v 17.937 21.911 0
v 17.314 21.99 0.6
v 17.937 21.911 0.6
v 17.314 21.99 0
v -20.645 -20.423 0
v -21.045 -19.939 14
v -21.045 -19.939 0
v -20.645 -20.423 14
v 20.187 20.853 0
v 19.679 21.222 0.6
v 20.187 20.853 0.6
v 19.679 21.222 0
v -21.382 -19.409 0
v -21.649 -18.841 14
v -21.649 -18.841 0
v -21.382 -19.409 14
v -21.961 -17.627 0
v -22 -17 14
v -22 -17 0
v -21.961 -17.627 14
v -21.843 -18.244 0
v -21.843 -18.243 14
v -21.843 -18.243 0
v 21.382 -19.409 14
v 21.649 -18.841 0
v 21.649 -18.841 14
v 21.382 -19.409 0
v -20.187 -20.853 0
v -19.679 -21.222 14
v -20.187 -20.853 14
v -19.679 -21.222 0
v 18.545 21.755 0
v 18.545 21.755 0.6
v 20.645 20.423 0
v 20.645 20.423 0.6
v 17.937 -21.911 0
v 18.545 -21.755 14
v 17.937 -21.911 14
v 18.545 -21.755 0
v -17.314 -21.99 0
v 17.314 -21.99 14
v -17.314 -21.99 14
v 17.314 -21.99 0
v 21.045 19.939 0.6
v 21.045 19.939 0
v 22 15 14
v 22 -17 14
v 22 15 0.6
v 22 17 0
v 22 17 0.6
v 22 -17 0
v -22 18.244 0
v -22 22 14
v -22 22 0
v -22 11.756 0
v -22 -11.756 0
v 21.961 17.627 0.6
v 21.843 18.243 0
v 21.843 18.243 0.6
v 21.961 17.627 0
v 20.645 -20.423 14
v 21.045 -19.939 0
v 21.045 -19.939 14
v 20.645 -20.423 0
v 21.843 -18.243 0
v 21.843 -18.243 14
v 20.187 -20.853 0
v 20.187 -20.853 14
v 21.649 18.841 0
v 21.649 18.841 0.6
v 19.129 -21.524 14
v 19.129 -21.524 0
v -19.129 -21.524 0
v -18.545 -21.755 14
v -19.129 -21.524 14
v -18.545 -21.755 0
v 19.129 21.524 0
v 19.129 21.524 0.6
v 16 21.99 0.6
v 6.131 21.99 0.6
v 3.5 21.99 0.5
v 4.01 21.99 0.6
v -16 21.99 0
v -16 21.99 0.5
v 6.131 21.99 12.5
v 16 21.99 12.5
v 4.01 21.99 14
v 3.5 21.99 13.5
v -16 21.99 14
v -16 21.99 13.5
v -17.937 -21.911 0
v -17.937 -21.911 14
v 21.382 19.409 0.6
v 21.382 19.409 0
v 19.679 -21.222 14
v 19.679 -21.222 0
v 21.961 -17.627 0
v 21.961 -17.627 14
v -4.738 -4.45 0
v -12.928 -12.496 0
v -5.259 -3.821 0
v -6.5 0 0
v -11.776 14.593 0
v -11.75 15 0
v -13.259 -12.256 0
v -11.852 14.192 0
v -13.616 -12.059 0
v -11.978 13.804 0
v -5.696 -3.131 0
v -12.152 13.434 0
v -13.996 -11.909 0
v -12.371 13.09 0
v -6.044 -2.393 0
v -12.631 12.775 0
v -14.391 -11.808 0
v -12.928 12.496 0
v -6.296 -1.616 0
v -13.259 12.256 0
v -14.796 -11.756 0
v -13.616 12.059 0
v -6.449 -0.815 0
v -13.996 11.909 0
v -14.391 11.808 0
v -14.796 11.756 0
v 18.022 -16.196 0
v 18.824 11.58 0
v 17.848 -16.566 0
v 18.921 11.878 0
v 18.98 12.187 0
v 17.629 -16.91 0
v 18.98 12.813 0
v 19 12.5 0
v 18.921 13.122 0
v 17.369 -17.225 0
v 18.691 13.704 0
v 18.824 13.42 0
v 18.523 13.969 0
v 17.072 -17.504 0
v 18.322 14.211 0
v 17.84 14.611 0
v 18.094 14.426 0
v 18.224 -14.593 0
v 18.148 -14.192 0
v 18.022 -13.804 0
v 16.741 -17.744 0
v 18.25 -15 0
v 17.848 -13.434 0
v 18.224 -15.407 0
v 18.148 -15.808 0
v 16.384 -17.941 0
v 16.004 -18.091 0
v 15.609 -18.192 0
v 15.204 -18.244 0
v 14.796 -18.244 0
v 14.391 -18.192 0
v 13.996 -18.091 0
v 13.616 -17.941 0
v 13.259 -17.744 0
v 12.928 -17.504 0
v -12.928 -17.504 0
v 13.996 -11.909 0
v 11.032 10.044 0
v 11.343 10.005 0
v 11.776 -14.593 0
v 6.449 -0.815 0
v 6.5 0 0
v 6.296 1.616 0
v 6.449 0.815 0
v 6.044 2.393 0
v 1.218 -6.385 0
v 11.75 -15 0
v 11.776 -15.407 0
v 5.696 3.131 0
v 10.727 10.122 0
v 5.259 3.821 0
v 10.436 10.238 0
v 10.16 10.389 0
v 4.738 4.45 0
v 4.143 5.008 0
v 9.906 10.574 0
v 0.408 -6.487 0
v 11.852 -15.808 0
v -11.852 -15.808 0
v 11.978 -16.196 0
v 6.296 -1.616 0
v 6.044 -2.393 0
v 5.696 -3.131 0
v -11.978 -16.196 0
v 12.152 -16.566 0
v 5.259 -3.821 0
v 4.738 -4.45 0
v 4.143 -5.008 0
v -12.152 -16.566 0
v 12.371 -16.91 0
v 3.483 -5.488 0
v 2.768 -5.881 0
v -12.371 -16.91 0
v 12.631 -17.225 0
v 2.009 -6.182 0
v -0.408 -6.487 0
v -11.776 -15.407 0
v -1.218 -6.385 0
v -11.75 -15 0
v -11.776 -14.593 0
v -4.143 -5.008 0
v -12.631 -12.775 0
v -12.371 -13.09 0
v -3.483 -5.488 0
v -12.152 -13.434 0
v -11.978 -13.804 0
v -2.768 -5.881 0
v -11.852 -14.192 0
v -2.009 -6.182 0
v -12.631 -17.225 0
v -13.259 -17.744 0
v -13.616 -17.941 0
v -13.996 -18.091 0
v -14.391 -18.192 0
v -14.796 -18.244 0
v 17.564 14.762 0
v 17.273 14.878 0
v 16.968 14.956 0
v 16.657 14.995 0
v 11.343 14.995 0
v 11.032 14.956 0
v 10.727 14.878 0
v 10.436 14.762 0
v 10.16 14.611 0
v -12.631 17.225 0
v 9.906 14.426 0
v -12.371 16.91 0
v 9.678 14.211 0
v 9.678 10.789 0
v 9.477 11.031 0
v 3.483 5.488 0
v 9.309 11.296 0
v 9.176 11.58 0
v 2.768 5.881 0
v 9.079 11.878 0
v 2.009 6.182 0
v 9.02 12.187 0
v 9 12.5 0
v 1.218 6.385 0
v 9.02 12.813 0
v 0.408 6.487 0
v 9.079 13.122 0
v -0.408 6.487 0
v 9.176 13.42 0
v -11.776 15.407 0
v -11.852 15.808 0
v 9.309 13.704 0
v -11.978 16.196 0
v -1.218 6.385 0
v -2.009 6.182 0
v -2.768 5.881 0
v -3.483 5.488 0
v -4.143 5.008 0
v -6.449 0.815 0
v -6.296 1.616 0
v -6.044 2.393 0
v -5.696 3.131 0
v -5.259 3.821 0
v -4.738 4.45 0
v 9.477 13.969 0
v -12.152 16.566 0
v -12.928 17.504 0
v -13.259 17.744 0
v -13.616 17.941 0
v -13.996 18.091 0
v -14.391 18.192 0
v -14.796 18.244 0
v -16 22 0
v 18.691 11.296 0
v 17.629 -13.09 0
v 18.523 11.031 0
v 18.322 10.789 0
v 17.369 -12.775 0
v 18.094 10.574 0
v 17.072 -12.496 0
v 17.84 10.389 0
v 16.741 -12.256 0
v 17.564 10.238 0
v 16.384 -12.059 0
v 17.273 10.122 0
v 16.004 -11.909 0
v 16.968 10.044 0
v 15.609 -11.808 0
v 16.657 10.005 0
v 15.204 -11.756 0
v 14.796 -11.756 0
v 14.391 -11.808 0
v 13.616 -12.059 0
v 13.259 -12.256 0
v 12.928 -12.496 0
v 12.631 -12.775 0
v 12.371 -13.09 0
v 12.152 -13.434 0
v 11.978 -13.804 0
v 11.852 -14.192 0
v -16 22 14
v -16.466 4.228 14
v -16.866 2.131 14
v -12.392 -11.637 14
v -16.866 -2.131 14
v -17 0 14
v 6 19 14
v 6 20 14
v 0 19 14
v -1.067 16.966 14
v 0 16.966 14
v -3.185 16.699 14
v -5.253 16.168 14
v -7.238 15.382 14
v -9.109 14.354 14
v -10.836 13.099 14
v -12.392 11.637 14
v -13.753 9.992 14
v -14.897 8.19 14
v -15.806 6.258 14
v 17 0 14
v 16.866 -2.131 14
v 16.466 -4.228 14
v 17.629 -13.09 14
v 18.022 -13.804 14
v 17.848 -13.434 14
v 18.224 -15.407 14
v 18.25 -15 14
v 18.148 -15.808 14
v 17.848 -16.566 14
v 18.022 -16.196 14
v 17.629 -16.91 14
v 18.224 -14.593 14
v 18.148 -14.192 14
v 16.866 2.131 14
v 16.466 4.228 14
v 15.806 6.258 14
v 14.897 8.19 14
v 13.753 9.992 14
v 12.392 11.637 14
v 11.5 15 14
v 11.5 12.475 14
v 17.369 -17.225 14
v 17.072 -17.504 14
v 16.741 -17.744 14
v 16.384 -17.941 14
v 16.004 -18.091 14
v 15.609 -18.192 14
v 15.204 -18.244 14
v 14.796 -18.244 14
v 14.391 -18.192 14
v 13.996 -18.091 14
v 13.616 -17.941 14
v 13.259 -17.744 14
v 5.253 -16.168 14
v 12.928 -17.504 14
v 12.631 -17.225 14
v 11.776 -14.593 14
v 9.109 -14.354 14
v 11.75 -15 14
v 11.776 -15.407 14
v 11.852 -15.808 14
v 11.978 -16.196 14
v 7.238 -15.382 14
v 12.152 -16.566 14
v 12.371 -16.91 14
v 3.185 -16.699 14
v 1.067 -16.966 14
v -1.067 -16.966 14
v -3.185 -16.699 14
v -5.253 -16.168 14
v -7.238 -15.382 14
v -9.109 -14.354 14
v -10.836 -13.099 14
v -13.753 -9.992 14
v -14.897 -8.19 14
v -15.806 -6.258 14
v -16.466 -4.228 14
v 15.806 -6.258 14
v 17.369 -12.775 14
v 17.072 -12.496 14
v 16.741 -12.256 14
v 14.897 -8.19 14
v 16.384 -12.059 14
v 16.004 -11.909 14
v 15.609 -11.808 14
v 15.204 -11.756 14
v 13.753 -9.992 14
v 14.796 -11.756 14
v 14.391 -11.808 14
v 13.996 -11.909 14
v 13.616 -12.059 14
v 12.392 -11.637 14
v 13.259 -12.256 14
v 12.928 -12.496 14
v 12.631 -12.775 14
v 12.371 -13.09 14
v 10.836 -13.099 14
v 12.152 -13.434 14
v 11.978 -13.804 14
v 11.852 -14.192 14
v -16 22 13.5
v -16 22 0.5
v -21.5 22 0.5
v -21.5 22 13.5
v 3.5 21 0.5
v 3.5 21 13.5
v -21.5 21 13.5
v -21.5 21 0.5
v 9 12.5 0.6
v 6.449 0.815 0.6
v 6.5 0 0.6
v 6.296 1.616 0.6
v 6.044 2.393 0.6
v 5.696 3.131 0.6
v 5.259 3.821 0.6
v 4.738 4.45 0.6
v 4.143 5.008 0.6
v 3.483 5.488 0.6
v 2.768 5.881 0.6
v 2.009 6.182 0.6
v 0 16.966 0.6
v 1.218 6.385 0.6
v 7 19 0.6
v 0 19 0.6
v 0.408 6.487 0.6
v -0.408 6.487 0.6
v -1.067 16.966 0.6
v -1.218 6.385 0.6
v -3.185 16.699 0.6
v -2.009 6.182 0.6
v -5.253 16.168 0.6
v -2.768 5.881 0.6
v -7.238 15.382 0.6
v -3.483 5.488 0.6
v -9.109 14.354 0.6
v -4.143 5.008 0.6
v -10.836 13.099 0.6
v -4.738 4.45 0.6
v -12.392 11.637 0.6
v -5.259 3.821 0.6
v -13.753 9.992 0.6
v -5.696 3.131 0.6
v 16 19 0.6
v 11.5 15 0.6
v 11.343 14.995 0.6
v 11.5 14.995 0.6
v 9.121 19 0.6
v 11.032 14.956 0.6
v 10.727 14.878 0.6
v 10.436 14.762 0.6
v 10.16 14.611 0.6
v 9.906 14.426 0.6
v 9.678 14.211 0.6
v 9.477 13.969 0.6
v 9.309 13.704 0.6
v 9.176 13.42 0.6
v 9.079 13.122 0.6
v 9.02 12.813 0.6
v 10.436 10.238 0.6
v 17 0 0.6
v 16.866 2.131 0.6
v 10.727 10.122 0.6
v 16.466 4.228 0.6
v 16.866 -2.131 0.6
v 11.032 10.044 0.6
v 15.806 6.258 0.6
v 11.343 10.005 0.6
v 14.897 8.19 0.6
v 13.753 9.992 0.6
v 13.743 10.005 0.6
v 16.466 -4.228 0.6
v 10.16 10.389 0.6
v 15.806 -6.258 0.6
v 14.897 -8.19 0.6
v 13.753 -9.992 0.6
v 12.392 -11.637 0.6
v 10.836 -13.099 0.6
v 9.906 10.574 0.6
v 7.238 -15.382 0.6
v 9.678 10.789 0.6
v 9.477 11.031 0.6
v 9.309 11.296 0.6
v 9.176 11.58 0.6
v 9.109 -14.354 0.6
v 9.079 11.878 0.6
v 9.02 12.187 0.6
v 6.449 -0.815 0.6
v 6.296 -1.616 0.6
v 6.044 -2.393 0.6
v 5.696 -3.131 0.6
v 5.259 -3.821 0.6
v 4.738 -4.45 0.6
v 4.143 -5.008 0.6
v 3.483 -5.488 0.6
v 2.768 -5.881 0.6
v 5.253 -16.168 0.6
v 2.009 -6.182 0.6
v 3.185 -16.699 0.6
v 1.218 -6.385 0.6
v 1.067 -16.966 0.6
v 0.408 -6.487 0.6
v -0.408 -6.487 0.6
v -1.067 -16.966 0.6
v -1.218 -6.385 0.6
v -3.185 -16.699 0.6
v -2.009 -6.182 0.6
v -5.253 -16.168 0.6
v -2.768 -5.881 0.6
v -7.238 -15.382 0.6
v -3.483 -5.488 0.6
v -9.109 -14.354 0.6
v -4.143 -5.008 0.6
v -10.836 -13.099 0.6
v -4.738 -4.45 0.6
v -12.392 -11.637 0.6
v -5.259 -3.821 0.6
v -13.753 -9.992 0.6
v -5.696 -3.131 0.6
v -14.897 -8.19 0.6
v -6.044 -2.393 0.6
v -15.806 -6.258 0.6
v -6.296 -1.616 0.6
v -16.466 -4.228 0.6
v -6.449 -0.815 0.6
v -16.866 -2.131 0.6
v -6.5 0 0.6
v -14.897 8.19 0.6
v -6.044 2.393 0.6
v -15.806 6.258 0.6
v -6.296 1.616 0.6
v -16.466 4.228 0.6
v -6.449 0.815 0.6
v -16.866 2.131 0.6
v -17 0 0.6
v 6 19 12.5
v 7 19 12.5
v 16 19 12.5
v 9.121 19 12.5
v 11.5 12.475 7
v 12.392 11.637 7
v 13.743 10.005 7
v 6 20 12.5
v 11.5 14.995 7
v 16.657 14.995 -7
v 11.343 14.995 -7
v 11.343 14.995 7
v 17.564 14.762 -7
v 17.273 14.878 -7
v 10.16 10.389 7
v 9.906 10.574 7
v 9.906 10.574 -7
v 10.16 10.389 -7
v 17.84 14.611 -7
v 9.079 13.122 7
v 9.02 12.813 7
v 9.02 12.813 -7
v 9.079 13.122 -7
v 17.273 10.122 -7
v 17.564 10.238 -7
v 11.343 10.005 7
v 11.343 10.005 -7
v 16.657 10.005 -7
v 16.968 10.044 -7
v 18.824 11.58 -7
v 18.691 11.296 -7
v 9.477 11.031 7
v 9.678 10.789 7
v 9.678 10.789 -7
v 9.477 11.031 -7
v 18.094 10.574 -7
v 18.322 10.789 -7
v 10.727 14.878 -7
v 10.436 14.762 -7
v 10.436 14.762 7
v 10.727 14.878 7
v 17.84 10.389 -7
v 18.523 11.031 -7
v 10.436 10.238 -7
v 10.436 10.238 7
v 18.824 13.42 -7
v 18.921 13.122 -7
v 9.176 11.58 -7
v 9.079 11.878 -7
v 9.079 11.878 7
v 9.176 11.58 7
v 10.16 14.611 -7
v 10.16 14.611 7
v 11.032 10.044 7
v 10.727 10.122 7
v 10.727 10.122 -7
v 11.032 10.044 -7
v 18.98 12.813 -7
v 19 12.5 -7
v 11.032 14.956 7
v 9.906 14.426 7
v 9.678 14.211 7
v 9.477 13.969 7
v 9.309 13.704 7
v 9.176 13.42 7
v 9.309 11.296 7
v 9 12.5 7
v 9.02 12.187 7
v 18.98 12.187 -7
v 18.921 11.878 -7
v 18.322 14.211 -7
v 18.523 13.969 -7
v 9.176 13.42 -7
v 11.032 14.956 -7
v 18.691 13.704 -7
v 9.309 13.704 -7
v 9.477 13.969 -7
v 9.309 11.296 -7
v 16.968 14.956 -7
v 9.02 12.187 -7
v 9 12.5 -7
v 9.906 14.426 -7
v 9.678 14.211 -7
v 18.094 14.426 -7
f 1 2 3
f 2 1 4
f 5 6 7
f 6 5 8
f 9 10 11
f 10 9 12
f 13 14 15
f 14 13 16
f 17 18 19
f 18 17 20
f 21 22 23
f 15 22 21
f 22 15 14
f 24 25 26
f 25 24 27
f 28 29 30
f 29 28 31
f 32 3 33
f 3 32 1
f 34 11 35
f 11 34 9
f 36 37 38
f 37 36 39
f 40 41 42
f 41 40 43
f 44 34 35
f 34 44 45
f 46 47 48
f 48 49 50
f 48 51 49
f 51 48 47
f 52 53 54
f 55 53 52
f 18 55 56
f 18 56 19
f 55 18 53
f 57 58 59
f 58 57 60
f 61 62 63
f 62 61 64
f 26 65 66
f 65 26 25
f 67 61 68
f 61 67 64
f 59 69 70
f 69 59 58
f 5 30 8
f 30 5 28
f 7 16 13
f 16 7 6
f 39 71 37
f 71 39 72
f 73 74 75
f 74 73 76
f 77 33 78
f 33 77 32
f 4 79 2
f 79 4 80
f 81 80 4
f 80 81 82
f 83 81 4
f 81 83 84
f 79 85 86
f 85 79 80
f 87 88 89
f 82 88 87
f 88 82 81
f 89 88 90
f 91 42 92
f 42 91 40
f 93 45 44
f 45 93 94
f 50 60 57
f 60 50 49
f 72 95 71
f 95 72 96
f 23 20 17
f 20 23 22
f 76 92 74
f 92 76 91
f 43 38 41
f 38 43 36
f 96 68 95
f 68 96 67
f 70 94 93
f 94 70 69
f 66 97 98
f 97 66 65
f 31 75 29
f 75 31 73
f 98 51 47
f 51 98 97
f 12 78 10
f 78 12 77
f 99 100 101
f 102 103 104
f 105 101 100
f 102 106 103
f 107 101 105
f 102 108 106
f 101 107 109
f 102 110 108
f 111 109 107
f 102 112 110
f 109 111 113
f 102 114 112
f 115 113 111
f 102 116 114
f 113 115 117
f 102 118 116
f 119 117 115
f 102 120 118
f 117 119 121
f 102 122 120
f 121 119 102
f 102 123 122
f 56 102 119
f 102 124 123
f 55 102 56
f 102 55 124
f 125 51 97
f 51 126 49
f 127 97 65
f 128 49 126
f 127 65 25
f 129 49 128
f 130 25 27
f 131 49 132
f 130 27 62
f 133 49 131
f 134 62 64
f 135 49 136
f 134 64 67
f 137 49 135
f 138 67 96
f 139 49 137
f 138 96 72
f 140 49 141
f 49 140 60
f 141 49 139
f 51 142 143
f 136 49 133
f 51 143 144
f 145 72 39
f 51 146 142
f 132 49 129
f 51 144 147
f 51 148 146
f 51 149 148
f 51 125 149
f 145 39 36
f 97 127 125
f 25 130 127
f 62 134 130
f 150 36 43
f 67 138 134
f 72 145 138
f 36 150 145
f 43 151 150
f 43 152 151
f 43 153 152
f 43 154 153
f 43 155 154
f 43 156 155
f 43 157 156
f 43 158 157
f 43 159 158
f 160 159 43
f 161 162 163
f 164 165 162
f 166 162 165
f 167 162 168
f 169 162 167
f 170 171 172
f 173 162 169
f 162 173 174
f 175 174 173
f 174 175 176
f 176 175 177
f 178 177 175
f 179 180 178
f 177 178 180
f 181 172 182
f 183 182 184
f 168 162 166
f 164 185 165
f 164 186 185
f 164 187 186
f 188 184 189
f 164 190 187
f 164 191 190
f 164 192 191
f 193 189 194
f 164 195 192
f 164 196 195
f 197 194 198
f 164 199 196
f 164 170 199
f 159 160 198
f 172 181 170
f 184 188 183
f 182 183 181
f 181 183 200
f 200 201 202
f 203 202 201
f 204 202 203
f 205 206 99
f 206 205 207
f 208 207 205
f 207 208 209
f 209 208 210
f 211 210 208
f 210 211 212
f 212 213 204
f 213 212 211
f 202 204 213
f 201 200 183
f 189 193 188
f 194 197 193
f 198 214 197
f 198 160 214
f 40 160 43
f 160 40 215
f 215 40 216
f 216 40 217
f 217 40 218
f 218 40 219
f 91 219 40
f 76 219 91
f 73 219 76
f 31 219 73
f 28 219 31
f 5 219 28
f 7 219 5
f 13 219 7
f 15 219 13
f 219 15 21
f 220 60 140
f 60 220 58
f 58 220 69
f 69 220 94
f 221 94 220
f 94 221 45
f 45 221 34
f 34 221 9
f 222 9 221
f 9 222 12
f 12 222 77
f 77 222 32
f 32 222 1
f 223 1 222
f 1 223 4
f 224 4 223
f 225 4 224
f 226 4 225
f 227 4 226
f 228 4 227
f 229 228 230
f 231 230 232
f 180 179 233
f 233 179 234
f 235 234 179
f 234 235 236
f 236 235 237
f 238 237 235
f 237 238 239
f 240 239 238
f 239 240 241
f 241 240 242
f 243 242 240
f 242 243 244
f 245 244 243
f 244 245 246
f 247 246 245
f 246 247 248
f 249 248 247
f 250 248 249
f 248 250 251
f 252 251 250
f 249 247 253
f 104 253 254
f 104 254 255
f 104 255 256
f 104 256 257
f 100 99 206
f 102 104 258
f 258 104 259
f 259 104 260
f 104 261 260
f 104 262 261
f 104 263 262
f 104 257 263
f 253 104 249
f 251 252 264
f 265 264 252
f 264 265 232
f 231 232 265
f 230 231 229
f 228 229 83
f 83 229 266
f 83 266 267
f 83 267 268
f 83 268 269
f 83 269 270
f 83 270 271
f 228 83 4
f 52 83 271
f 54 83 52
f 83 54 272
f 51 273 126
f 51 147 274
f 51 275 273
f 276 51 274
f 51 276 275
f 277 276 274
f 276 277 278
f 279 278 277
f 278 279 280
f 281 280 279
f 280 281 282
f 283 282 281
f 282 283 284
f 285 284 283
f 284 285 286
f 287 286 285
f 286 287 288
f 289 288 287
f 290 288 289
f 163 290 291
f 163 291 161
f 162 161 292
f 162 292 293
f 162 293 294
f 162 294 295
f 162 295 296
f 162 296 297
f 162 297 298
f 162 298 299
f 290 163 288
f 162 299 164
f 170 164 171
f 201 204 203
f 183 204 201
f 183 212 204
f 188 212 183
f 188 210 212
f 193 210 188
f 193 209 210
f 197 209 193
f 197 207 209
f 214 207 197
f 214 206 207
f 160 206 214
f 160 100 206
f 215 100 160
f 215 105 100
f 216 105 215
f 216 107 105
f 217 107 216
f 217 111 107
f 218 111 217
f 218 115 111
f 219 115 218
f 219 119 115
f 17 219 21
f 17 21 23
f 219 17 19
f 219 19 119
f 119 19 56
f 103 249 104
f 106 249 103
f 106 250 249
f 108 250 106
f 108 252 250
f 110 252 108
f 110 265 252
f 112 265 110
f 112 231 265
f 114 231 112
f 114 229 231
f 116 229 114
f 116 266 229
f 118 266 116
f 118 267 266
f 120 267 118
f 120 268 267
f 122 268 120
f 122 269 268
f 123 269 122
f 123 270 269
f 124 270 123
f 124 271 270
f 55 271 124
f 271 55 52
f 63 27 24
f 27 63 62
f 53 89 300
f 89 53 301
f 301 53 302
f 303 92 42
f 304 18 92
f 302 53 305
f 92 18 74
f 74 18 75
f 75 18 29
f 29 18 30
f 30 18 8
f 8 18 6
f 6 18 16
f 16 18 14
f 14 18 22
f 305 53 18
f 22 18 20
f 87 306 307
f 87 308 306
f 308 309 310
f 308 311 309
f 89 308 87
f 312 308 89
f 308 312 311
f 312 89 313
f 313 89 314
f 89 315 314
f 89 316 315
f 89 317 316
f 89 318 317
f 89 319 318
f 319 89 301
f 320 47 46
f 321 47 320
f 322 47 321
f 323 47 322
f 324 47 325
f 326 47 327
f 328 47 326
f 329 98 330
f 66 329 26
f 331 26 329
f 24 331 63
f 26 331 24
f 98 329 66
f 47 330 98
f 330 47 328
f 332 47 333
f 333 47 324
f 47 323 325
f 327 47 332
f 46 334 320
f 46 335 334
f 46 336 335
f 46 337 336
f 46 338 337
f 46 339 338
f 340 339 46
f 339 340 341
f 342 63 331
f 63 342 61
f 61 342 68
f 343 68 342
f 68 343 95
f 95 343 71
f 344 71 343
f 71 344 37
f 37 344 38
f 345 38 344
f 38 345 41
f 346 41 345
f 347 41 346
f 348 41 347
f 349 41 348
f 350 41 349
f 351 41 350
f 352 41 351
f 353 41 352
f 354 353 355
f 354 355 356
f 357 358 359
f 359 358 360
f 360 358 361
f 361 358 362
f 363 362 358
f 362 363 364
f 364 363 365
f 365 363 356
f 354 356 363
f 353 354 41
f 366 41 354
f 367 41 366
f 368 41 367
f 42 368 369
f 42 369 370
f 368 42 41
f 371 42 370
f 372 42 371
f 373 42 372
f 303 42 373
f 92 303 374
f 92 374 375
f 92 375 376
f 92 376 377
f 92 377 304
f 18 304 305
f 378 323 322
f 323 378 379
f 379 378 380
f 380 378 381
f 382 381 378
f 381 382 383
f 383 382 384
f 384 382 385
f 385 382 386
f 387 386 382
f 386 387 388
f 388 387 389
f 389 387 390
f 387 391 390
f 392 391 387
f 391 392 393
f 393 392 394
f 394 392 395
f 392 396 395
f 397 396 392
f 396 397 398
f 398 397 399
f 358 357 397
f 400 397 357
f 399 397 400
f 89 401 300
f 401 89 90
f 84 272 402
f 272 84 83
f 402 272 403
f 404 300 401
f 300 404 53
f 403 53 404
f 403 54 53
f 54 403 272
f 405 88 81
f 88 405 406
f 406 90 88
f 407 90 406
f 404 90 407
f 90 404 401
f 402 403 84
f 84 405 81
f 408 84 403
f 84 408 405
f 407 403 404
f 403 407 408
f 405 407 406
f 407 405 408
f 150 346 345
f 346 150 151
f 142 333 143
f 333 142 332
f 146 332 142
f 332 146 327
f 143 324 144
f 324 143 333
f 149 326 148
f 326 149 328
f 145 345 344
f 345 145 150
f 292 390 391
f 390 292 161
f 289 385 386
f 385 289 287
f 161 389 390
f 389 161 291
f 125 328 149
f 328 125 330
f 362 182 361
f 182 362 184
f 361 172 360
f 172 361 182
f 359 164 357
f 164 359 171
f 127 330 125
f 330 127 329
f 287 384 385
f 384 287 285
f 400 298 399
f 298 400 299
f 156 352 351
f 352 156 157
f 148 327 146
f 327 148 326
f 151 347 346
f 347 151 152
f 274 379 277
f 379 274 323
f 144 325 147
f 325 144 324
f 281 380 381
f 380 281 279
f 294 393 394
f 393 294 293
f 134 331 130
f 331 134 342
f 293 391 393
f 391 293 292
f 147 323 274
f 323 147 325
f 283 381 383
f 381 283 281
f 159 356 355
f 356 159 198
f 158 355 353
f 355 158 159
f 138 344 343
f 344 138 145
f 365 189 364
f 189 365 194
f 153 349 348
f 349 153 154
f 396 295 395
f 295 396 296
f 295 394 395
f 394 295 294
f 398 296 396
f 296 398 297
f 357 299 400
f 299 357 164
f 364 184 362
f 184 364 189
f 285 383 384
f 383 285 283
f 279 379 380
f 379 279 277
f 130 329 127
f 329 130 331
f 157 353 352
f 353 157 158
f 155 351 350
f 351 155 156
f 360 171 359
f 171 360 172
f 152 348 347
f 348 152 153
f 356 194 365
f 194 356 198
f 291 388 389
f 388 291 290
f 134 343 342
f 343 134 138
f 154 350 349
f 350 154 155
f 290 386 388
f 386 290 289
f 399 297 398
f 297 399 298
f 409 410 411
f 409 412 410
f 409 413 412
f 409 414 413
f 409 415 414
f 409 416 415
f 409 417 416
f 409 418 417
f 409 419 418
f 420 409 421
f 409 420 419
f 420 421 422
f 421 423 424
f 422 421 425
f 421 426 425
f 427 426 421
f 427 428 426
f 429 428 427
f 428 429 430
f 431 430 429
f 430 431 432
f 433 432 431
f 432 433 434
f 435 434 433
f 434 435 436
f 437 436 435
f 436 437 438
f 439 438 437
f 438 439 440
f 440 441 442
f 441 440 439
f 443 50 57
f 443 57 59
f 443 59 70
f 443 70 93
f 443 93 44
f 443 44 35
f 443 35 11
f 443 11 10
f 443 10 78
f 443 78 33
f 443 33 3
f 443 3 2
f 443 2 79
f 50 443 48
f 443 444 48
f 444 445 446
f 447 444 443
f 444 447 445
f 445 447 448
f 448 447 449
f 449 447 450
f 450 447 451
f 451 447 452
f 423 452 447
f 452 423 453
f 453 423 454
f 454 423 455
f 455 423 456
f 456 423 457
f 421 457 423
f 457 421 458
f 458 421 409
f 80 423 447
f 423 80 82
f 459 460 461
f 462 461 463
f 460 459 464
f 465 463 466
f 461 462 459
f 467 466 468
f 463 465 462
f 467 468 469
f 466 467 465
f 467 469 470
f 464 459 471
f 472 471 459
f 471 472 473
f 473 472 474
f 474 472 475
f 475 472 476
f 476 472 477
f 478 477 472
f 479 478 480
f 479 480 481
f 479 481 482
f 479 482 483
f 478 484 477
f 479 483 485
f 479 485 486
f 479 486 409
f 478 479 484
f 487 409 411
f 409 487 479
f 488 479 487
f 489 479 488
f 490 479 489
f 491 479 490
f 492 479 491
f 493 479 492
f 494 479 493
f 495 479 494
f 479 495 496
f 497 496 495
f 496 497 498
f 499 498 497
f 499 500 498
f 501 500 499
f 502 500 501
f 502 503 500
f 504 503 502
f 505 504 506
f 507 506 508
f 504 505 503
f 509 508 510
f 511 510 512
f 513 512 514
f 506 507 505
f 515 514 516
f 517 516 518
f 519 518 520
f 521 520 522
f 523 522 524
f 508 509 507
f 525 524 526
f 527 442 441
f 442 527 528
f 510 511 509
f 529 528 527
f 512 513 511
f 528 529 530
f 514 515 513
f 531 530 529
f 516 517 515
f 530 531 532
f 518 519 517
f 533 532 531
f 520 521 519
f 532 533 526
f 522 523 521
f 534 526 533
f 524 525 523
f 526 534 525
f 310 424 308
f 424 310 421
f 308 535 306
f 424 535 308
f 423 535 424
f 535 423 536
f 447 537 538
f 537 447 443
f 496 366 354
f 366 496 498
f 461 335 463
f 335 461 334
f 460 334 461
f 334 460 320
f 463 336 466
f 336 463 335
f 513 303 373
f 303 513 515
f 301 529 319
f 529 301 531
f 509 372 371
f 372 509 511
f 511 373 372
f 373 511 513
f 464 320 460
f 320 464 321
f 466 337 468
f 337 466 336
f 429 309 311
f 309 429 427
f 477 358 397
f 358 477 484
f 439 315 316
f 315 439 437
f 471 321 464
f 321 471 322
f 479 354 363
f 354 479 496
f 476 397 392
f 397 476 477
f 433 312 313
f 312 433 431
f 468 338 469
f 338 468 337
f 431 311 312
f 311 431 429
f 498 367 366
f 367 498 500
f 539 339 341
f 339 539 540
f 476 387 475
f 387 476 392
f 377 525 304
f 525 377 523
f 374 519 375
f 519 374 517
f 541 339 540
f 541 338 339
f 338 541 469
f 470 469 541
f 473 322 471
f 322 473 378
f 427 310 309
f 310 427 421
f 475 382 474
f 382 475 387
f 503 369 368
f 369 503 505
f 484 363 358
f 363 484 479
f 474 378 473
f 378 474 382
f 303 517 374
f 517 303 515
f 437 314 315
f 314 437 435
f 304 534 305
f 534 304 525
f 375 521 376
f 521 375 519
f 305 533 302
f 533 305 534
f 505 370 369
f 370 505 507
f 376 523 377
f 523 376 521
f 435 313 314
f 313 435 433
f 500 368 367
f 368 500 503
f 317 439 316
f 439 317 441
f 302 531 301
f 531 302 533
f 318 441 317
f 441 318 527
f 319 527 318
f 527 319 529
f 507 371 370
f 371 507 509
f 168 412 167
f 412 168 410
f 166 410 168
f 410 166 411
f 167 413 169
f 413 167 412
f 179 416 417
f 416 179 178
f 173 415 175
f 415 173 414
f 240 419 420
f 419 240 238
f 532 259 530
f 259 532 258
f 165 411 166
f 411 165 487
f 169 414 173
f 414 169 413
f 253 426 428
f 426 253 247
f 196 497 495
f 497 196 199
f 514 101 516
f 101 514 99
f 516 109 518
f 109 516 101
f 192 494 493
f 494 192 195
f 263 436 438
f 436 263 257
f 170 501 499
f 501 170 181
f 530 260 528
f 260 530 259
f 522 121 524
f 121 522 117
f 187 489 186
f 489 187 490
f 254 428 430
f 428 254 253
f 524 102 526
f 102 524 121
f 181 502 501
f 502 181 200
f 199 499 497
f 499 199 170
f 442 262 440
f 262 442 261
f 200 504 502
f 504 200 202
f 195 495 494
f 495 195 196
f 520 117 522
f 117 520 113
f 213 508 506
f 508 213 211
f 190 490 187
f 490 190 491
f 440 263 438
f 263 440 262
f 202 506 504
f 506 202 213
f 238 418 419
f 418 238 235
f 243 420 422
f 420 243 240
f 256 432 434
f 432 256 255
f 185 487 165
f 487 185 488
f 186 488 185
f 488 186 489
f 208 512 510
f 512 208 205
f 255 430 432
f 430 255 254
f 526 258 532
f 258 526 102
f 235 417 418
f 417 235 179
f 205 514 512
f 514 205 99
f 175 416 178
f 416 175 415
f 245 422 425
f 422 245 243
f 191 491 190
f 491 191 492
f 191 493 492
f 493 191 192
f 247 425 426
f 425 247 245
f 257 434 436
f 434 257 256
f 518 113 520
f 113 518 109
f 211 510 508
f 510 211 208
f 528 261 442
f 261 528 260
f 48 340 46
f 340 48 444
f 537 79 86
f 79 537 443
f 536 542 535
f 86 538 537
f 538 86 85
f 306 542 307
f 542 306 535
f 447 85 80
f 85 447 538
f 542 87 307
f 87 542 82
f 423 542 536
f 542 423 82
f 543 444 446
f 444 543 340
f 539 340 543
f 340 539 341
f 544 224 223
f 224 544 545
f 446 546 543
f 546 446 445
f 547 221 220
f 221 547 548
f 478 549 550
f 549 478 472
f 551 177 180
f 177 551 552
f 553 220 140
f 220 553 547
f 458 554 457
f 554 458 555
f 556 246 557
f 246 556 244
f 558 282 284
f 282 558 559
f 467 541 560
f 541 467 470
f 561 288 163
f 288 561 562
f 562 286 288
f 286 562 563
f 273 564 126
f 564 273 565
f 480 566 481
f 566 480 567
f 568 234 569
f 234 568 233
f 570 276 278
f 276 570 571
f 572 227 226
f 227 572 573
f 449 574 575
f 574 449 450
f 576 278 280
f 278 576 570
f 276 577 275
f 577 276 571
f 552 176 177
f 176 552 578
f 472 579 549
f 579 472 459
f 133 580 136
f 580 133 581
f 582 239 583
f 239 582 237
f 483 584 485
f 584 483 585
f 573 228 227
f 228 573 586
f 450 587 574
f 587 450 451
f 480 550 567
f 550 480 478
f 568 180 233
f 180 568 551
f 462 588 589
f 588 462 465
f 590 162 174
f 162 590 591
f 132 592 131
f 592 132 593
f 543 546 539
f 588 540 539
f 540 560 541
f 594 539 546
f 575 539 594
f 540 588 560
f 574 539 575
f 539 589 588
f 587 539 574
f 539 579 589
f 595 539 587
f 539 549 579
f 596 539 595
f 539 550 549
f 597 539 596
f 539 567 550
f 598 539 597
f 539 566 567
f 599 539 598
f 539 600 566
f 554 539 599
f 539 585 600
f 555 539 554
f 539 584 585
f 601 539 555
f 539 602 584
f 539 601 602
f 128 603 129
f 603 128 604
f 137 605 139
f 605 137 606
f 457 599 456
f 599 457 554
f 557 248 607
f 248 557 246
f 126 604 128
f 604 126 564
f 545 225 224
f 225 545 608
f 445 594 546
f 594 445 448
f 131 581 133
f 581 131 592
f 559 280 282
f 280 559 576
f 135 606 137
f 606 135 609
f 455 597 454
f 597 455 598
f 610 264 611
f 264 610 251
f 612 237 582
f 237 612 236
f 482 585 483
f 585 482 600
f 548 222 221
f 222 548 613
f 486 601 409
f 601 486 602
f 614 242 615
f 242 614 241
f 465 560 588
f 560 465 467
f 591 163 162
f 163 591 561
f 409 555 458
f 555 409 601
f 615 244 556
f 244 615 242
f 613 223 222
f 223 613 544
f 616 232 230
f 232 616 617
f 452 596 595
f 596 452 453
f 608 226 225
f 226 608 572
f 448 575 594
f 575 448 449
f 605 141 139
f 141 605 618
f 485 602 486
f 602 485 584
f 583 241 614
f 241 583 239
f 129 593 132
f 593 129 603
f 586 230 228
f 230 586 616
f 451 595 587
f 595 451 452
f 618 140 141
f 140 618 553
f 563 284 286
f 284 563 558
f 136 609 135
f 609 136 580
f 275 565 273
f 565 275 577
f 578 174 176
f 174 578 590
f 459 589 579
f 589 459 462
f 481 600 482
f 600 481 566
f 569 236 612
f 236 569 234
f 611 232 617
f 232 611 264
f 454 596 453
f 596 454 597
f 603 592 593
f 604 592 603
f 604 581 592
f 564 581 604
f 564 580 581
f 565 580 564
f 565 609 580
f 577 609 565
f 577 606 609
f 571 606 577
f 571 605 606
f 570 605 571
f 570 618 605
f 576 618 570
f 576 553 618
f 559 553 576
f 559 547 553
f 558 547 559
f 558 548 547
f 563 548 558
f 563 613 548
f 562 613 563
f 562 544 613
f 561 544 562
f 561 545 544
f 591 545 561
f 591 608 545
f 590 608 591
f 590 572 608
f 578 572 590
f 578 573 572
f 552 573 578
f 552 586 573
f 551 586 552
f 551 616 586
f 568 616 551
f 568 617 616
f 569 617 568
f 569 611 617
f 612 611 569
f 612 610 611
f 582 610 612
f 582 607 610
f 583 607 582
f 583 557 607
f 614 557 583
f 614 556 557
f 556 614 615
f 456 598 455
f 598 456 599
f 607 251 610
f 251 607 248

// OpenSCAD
$fn = 50;


union() {
	difference() {
		union() {
			hull() {
				translate(v = [-17.0000000000, 17.0000000000, 0]) {
					cylinder(h = 14, r = 5);
				}
				translate(v = [17.0000000000, 17.0000000000, 0]) {
					cylinder(h = 14, r = 5);
				}
				translate(v = [-17.0000000000, -17.0000000000, 0]) {
					cylinder(h = 14, r = 5);
				}
				translate(v = [17.0000000000, -17.0000000000, 0]) {
					cylinder(h = 14, r = 5);
				}
			}
			translate(v = [-22.0000000000, 16.0000000000, 0]) {
				cube(size = [6, 6, 14]);
			}
		}
		union() {
			translate(v = [-22.5000000000, -15.0000000000, -250.0000000000]) {
				rotate(a = [0, 0, 0]) {
					difference() {
						union() {
							hull() {
								translate(v = [7.5000000000, 0, 0]) {
									cylinder(h = 250, r = 3.2500000000, r1 = 3.2500000000, r2 = 3.2500000000);
								}
								translate(v = [-7.5000000000, 0, 0]) {
									cylinder(h = 250, r = 3.2500000000, r1 = 3.2500000000, r2 = 3.2500000000);
								}
							}
						}
						union();
					}
				}
			}
			translate(v = [-22.5000000000, 15.0000000000, -250.0000000000]) {
				rotate(a = [0, 0, 0]) {
					difference() {
						union() {
							hull() {
								translate(v = [7.5000000000, 0, 0]) {
									cylinder(h = 250, r = 3.2500000000, r1 = 3.2500000000, r2 = 3.2500000000);
								}
								translate(v = [-7.5000000000, 0, 0]) {
									cylinder(h = 250, r = 3.2500000000, r1 = 3.2500000000, r2 = 3.2500000000);
								}
							}
						}
						union();
					}
				}
			}
			translate(v = [-21.5000000000, 21.0000000000, 0.5000000000]) {
				cube(size = [25, 1, 13.0000000000]);
			}
			translate(v = [15.0000000000, -15.0000000000, 0]) {
				cylinder(h = 100, r = 3.2500000000);
			}
			translate(v = [0.0000000000, 11.0000000000, 0.6000000000]) {
				cube(size = [11, 8, 16.4000000000]);
			}
			translate(v = [0, 0, 0.6000000000]) {
				cylinder(h = 16.4000000000, r = 17.0000000000);
			}
			translate(v = [0, 0, -7.0000000000]) {
				cylinder(h = 14, r = 6.5000000000);
			}
			translate(v = [0.0000000000, 15.0000000000, 0.6000000000]) {
				cube(size = [22.0000000000, 4, 16.4000000000]);
			}
			translate(v = [16.0000000000, 15.0000000000, 0.6000000000]) {
				cube(size = [6, 7, 16.4000000000]);
			}
			translate(v = [6.0000000000, 15.0000000000, 12.5000000000]) {
				cube(size = [16, 7, 1.5000000000]);
			}
			translate(v = [3.2500000000, 22.7500000000, 0.6000000000]) {
				rotate(a = [0, 0, -45]) {
					cube(size = [7.5000000000, 1.5000000000, 16.4000000000]);
				}
			}
			translate(v = [2.5000000000, 10.0000000000, 0.6000000000]) {
				cube(size = [9.0000000000, 5, 13.4000000000]);
			}
		}
	}
	union() {
		translate(v = [14, 12.5000000000, -7.0000000000]) {
			rotate(a = [0, 0, 0]) {
				difference() {
					union() {
						#hull() {
							#translate(v = [2.5000000000, 0, 0]) {
								cylinder(h = 14, r = 2.5000000000, r1 = 2.5000000000, r2 = 2.5000000000);
							}
							#translate(v = [-2.5000000000, 0, 0]) {
								cylinder(h = 14, r = 2.5000000000, r1 = 2.5000000000, r2 = 2.5000000000);
							}
						}
					}
					union();
				}
			}
		}
	}
}
